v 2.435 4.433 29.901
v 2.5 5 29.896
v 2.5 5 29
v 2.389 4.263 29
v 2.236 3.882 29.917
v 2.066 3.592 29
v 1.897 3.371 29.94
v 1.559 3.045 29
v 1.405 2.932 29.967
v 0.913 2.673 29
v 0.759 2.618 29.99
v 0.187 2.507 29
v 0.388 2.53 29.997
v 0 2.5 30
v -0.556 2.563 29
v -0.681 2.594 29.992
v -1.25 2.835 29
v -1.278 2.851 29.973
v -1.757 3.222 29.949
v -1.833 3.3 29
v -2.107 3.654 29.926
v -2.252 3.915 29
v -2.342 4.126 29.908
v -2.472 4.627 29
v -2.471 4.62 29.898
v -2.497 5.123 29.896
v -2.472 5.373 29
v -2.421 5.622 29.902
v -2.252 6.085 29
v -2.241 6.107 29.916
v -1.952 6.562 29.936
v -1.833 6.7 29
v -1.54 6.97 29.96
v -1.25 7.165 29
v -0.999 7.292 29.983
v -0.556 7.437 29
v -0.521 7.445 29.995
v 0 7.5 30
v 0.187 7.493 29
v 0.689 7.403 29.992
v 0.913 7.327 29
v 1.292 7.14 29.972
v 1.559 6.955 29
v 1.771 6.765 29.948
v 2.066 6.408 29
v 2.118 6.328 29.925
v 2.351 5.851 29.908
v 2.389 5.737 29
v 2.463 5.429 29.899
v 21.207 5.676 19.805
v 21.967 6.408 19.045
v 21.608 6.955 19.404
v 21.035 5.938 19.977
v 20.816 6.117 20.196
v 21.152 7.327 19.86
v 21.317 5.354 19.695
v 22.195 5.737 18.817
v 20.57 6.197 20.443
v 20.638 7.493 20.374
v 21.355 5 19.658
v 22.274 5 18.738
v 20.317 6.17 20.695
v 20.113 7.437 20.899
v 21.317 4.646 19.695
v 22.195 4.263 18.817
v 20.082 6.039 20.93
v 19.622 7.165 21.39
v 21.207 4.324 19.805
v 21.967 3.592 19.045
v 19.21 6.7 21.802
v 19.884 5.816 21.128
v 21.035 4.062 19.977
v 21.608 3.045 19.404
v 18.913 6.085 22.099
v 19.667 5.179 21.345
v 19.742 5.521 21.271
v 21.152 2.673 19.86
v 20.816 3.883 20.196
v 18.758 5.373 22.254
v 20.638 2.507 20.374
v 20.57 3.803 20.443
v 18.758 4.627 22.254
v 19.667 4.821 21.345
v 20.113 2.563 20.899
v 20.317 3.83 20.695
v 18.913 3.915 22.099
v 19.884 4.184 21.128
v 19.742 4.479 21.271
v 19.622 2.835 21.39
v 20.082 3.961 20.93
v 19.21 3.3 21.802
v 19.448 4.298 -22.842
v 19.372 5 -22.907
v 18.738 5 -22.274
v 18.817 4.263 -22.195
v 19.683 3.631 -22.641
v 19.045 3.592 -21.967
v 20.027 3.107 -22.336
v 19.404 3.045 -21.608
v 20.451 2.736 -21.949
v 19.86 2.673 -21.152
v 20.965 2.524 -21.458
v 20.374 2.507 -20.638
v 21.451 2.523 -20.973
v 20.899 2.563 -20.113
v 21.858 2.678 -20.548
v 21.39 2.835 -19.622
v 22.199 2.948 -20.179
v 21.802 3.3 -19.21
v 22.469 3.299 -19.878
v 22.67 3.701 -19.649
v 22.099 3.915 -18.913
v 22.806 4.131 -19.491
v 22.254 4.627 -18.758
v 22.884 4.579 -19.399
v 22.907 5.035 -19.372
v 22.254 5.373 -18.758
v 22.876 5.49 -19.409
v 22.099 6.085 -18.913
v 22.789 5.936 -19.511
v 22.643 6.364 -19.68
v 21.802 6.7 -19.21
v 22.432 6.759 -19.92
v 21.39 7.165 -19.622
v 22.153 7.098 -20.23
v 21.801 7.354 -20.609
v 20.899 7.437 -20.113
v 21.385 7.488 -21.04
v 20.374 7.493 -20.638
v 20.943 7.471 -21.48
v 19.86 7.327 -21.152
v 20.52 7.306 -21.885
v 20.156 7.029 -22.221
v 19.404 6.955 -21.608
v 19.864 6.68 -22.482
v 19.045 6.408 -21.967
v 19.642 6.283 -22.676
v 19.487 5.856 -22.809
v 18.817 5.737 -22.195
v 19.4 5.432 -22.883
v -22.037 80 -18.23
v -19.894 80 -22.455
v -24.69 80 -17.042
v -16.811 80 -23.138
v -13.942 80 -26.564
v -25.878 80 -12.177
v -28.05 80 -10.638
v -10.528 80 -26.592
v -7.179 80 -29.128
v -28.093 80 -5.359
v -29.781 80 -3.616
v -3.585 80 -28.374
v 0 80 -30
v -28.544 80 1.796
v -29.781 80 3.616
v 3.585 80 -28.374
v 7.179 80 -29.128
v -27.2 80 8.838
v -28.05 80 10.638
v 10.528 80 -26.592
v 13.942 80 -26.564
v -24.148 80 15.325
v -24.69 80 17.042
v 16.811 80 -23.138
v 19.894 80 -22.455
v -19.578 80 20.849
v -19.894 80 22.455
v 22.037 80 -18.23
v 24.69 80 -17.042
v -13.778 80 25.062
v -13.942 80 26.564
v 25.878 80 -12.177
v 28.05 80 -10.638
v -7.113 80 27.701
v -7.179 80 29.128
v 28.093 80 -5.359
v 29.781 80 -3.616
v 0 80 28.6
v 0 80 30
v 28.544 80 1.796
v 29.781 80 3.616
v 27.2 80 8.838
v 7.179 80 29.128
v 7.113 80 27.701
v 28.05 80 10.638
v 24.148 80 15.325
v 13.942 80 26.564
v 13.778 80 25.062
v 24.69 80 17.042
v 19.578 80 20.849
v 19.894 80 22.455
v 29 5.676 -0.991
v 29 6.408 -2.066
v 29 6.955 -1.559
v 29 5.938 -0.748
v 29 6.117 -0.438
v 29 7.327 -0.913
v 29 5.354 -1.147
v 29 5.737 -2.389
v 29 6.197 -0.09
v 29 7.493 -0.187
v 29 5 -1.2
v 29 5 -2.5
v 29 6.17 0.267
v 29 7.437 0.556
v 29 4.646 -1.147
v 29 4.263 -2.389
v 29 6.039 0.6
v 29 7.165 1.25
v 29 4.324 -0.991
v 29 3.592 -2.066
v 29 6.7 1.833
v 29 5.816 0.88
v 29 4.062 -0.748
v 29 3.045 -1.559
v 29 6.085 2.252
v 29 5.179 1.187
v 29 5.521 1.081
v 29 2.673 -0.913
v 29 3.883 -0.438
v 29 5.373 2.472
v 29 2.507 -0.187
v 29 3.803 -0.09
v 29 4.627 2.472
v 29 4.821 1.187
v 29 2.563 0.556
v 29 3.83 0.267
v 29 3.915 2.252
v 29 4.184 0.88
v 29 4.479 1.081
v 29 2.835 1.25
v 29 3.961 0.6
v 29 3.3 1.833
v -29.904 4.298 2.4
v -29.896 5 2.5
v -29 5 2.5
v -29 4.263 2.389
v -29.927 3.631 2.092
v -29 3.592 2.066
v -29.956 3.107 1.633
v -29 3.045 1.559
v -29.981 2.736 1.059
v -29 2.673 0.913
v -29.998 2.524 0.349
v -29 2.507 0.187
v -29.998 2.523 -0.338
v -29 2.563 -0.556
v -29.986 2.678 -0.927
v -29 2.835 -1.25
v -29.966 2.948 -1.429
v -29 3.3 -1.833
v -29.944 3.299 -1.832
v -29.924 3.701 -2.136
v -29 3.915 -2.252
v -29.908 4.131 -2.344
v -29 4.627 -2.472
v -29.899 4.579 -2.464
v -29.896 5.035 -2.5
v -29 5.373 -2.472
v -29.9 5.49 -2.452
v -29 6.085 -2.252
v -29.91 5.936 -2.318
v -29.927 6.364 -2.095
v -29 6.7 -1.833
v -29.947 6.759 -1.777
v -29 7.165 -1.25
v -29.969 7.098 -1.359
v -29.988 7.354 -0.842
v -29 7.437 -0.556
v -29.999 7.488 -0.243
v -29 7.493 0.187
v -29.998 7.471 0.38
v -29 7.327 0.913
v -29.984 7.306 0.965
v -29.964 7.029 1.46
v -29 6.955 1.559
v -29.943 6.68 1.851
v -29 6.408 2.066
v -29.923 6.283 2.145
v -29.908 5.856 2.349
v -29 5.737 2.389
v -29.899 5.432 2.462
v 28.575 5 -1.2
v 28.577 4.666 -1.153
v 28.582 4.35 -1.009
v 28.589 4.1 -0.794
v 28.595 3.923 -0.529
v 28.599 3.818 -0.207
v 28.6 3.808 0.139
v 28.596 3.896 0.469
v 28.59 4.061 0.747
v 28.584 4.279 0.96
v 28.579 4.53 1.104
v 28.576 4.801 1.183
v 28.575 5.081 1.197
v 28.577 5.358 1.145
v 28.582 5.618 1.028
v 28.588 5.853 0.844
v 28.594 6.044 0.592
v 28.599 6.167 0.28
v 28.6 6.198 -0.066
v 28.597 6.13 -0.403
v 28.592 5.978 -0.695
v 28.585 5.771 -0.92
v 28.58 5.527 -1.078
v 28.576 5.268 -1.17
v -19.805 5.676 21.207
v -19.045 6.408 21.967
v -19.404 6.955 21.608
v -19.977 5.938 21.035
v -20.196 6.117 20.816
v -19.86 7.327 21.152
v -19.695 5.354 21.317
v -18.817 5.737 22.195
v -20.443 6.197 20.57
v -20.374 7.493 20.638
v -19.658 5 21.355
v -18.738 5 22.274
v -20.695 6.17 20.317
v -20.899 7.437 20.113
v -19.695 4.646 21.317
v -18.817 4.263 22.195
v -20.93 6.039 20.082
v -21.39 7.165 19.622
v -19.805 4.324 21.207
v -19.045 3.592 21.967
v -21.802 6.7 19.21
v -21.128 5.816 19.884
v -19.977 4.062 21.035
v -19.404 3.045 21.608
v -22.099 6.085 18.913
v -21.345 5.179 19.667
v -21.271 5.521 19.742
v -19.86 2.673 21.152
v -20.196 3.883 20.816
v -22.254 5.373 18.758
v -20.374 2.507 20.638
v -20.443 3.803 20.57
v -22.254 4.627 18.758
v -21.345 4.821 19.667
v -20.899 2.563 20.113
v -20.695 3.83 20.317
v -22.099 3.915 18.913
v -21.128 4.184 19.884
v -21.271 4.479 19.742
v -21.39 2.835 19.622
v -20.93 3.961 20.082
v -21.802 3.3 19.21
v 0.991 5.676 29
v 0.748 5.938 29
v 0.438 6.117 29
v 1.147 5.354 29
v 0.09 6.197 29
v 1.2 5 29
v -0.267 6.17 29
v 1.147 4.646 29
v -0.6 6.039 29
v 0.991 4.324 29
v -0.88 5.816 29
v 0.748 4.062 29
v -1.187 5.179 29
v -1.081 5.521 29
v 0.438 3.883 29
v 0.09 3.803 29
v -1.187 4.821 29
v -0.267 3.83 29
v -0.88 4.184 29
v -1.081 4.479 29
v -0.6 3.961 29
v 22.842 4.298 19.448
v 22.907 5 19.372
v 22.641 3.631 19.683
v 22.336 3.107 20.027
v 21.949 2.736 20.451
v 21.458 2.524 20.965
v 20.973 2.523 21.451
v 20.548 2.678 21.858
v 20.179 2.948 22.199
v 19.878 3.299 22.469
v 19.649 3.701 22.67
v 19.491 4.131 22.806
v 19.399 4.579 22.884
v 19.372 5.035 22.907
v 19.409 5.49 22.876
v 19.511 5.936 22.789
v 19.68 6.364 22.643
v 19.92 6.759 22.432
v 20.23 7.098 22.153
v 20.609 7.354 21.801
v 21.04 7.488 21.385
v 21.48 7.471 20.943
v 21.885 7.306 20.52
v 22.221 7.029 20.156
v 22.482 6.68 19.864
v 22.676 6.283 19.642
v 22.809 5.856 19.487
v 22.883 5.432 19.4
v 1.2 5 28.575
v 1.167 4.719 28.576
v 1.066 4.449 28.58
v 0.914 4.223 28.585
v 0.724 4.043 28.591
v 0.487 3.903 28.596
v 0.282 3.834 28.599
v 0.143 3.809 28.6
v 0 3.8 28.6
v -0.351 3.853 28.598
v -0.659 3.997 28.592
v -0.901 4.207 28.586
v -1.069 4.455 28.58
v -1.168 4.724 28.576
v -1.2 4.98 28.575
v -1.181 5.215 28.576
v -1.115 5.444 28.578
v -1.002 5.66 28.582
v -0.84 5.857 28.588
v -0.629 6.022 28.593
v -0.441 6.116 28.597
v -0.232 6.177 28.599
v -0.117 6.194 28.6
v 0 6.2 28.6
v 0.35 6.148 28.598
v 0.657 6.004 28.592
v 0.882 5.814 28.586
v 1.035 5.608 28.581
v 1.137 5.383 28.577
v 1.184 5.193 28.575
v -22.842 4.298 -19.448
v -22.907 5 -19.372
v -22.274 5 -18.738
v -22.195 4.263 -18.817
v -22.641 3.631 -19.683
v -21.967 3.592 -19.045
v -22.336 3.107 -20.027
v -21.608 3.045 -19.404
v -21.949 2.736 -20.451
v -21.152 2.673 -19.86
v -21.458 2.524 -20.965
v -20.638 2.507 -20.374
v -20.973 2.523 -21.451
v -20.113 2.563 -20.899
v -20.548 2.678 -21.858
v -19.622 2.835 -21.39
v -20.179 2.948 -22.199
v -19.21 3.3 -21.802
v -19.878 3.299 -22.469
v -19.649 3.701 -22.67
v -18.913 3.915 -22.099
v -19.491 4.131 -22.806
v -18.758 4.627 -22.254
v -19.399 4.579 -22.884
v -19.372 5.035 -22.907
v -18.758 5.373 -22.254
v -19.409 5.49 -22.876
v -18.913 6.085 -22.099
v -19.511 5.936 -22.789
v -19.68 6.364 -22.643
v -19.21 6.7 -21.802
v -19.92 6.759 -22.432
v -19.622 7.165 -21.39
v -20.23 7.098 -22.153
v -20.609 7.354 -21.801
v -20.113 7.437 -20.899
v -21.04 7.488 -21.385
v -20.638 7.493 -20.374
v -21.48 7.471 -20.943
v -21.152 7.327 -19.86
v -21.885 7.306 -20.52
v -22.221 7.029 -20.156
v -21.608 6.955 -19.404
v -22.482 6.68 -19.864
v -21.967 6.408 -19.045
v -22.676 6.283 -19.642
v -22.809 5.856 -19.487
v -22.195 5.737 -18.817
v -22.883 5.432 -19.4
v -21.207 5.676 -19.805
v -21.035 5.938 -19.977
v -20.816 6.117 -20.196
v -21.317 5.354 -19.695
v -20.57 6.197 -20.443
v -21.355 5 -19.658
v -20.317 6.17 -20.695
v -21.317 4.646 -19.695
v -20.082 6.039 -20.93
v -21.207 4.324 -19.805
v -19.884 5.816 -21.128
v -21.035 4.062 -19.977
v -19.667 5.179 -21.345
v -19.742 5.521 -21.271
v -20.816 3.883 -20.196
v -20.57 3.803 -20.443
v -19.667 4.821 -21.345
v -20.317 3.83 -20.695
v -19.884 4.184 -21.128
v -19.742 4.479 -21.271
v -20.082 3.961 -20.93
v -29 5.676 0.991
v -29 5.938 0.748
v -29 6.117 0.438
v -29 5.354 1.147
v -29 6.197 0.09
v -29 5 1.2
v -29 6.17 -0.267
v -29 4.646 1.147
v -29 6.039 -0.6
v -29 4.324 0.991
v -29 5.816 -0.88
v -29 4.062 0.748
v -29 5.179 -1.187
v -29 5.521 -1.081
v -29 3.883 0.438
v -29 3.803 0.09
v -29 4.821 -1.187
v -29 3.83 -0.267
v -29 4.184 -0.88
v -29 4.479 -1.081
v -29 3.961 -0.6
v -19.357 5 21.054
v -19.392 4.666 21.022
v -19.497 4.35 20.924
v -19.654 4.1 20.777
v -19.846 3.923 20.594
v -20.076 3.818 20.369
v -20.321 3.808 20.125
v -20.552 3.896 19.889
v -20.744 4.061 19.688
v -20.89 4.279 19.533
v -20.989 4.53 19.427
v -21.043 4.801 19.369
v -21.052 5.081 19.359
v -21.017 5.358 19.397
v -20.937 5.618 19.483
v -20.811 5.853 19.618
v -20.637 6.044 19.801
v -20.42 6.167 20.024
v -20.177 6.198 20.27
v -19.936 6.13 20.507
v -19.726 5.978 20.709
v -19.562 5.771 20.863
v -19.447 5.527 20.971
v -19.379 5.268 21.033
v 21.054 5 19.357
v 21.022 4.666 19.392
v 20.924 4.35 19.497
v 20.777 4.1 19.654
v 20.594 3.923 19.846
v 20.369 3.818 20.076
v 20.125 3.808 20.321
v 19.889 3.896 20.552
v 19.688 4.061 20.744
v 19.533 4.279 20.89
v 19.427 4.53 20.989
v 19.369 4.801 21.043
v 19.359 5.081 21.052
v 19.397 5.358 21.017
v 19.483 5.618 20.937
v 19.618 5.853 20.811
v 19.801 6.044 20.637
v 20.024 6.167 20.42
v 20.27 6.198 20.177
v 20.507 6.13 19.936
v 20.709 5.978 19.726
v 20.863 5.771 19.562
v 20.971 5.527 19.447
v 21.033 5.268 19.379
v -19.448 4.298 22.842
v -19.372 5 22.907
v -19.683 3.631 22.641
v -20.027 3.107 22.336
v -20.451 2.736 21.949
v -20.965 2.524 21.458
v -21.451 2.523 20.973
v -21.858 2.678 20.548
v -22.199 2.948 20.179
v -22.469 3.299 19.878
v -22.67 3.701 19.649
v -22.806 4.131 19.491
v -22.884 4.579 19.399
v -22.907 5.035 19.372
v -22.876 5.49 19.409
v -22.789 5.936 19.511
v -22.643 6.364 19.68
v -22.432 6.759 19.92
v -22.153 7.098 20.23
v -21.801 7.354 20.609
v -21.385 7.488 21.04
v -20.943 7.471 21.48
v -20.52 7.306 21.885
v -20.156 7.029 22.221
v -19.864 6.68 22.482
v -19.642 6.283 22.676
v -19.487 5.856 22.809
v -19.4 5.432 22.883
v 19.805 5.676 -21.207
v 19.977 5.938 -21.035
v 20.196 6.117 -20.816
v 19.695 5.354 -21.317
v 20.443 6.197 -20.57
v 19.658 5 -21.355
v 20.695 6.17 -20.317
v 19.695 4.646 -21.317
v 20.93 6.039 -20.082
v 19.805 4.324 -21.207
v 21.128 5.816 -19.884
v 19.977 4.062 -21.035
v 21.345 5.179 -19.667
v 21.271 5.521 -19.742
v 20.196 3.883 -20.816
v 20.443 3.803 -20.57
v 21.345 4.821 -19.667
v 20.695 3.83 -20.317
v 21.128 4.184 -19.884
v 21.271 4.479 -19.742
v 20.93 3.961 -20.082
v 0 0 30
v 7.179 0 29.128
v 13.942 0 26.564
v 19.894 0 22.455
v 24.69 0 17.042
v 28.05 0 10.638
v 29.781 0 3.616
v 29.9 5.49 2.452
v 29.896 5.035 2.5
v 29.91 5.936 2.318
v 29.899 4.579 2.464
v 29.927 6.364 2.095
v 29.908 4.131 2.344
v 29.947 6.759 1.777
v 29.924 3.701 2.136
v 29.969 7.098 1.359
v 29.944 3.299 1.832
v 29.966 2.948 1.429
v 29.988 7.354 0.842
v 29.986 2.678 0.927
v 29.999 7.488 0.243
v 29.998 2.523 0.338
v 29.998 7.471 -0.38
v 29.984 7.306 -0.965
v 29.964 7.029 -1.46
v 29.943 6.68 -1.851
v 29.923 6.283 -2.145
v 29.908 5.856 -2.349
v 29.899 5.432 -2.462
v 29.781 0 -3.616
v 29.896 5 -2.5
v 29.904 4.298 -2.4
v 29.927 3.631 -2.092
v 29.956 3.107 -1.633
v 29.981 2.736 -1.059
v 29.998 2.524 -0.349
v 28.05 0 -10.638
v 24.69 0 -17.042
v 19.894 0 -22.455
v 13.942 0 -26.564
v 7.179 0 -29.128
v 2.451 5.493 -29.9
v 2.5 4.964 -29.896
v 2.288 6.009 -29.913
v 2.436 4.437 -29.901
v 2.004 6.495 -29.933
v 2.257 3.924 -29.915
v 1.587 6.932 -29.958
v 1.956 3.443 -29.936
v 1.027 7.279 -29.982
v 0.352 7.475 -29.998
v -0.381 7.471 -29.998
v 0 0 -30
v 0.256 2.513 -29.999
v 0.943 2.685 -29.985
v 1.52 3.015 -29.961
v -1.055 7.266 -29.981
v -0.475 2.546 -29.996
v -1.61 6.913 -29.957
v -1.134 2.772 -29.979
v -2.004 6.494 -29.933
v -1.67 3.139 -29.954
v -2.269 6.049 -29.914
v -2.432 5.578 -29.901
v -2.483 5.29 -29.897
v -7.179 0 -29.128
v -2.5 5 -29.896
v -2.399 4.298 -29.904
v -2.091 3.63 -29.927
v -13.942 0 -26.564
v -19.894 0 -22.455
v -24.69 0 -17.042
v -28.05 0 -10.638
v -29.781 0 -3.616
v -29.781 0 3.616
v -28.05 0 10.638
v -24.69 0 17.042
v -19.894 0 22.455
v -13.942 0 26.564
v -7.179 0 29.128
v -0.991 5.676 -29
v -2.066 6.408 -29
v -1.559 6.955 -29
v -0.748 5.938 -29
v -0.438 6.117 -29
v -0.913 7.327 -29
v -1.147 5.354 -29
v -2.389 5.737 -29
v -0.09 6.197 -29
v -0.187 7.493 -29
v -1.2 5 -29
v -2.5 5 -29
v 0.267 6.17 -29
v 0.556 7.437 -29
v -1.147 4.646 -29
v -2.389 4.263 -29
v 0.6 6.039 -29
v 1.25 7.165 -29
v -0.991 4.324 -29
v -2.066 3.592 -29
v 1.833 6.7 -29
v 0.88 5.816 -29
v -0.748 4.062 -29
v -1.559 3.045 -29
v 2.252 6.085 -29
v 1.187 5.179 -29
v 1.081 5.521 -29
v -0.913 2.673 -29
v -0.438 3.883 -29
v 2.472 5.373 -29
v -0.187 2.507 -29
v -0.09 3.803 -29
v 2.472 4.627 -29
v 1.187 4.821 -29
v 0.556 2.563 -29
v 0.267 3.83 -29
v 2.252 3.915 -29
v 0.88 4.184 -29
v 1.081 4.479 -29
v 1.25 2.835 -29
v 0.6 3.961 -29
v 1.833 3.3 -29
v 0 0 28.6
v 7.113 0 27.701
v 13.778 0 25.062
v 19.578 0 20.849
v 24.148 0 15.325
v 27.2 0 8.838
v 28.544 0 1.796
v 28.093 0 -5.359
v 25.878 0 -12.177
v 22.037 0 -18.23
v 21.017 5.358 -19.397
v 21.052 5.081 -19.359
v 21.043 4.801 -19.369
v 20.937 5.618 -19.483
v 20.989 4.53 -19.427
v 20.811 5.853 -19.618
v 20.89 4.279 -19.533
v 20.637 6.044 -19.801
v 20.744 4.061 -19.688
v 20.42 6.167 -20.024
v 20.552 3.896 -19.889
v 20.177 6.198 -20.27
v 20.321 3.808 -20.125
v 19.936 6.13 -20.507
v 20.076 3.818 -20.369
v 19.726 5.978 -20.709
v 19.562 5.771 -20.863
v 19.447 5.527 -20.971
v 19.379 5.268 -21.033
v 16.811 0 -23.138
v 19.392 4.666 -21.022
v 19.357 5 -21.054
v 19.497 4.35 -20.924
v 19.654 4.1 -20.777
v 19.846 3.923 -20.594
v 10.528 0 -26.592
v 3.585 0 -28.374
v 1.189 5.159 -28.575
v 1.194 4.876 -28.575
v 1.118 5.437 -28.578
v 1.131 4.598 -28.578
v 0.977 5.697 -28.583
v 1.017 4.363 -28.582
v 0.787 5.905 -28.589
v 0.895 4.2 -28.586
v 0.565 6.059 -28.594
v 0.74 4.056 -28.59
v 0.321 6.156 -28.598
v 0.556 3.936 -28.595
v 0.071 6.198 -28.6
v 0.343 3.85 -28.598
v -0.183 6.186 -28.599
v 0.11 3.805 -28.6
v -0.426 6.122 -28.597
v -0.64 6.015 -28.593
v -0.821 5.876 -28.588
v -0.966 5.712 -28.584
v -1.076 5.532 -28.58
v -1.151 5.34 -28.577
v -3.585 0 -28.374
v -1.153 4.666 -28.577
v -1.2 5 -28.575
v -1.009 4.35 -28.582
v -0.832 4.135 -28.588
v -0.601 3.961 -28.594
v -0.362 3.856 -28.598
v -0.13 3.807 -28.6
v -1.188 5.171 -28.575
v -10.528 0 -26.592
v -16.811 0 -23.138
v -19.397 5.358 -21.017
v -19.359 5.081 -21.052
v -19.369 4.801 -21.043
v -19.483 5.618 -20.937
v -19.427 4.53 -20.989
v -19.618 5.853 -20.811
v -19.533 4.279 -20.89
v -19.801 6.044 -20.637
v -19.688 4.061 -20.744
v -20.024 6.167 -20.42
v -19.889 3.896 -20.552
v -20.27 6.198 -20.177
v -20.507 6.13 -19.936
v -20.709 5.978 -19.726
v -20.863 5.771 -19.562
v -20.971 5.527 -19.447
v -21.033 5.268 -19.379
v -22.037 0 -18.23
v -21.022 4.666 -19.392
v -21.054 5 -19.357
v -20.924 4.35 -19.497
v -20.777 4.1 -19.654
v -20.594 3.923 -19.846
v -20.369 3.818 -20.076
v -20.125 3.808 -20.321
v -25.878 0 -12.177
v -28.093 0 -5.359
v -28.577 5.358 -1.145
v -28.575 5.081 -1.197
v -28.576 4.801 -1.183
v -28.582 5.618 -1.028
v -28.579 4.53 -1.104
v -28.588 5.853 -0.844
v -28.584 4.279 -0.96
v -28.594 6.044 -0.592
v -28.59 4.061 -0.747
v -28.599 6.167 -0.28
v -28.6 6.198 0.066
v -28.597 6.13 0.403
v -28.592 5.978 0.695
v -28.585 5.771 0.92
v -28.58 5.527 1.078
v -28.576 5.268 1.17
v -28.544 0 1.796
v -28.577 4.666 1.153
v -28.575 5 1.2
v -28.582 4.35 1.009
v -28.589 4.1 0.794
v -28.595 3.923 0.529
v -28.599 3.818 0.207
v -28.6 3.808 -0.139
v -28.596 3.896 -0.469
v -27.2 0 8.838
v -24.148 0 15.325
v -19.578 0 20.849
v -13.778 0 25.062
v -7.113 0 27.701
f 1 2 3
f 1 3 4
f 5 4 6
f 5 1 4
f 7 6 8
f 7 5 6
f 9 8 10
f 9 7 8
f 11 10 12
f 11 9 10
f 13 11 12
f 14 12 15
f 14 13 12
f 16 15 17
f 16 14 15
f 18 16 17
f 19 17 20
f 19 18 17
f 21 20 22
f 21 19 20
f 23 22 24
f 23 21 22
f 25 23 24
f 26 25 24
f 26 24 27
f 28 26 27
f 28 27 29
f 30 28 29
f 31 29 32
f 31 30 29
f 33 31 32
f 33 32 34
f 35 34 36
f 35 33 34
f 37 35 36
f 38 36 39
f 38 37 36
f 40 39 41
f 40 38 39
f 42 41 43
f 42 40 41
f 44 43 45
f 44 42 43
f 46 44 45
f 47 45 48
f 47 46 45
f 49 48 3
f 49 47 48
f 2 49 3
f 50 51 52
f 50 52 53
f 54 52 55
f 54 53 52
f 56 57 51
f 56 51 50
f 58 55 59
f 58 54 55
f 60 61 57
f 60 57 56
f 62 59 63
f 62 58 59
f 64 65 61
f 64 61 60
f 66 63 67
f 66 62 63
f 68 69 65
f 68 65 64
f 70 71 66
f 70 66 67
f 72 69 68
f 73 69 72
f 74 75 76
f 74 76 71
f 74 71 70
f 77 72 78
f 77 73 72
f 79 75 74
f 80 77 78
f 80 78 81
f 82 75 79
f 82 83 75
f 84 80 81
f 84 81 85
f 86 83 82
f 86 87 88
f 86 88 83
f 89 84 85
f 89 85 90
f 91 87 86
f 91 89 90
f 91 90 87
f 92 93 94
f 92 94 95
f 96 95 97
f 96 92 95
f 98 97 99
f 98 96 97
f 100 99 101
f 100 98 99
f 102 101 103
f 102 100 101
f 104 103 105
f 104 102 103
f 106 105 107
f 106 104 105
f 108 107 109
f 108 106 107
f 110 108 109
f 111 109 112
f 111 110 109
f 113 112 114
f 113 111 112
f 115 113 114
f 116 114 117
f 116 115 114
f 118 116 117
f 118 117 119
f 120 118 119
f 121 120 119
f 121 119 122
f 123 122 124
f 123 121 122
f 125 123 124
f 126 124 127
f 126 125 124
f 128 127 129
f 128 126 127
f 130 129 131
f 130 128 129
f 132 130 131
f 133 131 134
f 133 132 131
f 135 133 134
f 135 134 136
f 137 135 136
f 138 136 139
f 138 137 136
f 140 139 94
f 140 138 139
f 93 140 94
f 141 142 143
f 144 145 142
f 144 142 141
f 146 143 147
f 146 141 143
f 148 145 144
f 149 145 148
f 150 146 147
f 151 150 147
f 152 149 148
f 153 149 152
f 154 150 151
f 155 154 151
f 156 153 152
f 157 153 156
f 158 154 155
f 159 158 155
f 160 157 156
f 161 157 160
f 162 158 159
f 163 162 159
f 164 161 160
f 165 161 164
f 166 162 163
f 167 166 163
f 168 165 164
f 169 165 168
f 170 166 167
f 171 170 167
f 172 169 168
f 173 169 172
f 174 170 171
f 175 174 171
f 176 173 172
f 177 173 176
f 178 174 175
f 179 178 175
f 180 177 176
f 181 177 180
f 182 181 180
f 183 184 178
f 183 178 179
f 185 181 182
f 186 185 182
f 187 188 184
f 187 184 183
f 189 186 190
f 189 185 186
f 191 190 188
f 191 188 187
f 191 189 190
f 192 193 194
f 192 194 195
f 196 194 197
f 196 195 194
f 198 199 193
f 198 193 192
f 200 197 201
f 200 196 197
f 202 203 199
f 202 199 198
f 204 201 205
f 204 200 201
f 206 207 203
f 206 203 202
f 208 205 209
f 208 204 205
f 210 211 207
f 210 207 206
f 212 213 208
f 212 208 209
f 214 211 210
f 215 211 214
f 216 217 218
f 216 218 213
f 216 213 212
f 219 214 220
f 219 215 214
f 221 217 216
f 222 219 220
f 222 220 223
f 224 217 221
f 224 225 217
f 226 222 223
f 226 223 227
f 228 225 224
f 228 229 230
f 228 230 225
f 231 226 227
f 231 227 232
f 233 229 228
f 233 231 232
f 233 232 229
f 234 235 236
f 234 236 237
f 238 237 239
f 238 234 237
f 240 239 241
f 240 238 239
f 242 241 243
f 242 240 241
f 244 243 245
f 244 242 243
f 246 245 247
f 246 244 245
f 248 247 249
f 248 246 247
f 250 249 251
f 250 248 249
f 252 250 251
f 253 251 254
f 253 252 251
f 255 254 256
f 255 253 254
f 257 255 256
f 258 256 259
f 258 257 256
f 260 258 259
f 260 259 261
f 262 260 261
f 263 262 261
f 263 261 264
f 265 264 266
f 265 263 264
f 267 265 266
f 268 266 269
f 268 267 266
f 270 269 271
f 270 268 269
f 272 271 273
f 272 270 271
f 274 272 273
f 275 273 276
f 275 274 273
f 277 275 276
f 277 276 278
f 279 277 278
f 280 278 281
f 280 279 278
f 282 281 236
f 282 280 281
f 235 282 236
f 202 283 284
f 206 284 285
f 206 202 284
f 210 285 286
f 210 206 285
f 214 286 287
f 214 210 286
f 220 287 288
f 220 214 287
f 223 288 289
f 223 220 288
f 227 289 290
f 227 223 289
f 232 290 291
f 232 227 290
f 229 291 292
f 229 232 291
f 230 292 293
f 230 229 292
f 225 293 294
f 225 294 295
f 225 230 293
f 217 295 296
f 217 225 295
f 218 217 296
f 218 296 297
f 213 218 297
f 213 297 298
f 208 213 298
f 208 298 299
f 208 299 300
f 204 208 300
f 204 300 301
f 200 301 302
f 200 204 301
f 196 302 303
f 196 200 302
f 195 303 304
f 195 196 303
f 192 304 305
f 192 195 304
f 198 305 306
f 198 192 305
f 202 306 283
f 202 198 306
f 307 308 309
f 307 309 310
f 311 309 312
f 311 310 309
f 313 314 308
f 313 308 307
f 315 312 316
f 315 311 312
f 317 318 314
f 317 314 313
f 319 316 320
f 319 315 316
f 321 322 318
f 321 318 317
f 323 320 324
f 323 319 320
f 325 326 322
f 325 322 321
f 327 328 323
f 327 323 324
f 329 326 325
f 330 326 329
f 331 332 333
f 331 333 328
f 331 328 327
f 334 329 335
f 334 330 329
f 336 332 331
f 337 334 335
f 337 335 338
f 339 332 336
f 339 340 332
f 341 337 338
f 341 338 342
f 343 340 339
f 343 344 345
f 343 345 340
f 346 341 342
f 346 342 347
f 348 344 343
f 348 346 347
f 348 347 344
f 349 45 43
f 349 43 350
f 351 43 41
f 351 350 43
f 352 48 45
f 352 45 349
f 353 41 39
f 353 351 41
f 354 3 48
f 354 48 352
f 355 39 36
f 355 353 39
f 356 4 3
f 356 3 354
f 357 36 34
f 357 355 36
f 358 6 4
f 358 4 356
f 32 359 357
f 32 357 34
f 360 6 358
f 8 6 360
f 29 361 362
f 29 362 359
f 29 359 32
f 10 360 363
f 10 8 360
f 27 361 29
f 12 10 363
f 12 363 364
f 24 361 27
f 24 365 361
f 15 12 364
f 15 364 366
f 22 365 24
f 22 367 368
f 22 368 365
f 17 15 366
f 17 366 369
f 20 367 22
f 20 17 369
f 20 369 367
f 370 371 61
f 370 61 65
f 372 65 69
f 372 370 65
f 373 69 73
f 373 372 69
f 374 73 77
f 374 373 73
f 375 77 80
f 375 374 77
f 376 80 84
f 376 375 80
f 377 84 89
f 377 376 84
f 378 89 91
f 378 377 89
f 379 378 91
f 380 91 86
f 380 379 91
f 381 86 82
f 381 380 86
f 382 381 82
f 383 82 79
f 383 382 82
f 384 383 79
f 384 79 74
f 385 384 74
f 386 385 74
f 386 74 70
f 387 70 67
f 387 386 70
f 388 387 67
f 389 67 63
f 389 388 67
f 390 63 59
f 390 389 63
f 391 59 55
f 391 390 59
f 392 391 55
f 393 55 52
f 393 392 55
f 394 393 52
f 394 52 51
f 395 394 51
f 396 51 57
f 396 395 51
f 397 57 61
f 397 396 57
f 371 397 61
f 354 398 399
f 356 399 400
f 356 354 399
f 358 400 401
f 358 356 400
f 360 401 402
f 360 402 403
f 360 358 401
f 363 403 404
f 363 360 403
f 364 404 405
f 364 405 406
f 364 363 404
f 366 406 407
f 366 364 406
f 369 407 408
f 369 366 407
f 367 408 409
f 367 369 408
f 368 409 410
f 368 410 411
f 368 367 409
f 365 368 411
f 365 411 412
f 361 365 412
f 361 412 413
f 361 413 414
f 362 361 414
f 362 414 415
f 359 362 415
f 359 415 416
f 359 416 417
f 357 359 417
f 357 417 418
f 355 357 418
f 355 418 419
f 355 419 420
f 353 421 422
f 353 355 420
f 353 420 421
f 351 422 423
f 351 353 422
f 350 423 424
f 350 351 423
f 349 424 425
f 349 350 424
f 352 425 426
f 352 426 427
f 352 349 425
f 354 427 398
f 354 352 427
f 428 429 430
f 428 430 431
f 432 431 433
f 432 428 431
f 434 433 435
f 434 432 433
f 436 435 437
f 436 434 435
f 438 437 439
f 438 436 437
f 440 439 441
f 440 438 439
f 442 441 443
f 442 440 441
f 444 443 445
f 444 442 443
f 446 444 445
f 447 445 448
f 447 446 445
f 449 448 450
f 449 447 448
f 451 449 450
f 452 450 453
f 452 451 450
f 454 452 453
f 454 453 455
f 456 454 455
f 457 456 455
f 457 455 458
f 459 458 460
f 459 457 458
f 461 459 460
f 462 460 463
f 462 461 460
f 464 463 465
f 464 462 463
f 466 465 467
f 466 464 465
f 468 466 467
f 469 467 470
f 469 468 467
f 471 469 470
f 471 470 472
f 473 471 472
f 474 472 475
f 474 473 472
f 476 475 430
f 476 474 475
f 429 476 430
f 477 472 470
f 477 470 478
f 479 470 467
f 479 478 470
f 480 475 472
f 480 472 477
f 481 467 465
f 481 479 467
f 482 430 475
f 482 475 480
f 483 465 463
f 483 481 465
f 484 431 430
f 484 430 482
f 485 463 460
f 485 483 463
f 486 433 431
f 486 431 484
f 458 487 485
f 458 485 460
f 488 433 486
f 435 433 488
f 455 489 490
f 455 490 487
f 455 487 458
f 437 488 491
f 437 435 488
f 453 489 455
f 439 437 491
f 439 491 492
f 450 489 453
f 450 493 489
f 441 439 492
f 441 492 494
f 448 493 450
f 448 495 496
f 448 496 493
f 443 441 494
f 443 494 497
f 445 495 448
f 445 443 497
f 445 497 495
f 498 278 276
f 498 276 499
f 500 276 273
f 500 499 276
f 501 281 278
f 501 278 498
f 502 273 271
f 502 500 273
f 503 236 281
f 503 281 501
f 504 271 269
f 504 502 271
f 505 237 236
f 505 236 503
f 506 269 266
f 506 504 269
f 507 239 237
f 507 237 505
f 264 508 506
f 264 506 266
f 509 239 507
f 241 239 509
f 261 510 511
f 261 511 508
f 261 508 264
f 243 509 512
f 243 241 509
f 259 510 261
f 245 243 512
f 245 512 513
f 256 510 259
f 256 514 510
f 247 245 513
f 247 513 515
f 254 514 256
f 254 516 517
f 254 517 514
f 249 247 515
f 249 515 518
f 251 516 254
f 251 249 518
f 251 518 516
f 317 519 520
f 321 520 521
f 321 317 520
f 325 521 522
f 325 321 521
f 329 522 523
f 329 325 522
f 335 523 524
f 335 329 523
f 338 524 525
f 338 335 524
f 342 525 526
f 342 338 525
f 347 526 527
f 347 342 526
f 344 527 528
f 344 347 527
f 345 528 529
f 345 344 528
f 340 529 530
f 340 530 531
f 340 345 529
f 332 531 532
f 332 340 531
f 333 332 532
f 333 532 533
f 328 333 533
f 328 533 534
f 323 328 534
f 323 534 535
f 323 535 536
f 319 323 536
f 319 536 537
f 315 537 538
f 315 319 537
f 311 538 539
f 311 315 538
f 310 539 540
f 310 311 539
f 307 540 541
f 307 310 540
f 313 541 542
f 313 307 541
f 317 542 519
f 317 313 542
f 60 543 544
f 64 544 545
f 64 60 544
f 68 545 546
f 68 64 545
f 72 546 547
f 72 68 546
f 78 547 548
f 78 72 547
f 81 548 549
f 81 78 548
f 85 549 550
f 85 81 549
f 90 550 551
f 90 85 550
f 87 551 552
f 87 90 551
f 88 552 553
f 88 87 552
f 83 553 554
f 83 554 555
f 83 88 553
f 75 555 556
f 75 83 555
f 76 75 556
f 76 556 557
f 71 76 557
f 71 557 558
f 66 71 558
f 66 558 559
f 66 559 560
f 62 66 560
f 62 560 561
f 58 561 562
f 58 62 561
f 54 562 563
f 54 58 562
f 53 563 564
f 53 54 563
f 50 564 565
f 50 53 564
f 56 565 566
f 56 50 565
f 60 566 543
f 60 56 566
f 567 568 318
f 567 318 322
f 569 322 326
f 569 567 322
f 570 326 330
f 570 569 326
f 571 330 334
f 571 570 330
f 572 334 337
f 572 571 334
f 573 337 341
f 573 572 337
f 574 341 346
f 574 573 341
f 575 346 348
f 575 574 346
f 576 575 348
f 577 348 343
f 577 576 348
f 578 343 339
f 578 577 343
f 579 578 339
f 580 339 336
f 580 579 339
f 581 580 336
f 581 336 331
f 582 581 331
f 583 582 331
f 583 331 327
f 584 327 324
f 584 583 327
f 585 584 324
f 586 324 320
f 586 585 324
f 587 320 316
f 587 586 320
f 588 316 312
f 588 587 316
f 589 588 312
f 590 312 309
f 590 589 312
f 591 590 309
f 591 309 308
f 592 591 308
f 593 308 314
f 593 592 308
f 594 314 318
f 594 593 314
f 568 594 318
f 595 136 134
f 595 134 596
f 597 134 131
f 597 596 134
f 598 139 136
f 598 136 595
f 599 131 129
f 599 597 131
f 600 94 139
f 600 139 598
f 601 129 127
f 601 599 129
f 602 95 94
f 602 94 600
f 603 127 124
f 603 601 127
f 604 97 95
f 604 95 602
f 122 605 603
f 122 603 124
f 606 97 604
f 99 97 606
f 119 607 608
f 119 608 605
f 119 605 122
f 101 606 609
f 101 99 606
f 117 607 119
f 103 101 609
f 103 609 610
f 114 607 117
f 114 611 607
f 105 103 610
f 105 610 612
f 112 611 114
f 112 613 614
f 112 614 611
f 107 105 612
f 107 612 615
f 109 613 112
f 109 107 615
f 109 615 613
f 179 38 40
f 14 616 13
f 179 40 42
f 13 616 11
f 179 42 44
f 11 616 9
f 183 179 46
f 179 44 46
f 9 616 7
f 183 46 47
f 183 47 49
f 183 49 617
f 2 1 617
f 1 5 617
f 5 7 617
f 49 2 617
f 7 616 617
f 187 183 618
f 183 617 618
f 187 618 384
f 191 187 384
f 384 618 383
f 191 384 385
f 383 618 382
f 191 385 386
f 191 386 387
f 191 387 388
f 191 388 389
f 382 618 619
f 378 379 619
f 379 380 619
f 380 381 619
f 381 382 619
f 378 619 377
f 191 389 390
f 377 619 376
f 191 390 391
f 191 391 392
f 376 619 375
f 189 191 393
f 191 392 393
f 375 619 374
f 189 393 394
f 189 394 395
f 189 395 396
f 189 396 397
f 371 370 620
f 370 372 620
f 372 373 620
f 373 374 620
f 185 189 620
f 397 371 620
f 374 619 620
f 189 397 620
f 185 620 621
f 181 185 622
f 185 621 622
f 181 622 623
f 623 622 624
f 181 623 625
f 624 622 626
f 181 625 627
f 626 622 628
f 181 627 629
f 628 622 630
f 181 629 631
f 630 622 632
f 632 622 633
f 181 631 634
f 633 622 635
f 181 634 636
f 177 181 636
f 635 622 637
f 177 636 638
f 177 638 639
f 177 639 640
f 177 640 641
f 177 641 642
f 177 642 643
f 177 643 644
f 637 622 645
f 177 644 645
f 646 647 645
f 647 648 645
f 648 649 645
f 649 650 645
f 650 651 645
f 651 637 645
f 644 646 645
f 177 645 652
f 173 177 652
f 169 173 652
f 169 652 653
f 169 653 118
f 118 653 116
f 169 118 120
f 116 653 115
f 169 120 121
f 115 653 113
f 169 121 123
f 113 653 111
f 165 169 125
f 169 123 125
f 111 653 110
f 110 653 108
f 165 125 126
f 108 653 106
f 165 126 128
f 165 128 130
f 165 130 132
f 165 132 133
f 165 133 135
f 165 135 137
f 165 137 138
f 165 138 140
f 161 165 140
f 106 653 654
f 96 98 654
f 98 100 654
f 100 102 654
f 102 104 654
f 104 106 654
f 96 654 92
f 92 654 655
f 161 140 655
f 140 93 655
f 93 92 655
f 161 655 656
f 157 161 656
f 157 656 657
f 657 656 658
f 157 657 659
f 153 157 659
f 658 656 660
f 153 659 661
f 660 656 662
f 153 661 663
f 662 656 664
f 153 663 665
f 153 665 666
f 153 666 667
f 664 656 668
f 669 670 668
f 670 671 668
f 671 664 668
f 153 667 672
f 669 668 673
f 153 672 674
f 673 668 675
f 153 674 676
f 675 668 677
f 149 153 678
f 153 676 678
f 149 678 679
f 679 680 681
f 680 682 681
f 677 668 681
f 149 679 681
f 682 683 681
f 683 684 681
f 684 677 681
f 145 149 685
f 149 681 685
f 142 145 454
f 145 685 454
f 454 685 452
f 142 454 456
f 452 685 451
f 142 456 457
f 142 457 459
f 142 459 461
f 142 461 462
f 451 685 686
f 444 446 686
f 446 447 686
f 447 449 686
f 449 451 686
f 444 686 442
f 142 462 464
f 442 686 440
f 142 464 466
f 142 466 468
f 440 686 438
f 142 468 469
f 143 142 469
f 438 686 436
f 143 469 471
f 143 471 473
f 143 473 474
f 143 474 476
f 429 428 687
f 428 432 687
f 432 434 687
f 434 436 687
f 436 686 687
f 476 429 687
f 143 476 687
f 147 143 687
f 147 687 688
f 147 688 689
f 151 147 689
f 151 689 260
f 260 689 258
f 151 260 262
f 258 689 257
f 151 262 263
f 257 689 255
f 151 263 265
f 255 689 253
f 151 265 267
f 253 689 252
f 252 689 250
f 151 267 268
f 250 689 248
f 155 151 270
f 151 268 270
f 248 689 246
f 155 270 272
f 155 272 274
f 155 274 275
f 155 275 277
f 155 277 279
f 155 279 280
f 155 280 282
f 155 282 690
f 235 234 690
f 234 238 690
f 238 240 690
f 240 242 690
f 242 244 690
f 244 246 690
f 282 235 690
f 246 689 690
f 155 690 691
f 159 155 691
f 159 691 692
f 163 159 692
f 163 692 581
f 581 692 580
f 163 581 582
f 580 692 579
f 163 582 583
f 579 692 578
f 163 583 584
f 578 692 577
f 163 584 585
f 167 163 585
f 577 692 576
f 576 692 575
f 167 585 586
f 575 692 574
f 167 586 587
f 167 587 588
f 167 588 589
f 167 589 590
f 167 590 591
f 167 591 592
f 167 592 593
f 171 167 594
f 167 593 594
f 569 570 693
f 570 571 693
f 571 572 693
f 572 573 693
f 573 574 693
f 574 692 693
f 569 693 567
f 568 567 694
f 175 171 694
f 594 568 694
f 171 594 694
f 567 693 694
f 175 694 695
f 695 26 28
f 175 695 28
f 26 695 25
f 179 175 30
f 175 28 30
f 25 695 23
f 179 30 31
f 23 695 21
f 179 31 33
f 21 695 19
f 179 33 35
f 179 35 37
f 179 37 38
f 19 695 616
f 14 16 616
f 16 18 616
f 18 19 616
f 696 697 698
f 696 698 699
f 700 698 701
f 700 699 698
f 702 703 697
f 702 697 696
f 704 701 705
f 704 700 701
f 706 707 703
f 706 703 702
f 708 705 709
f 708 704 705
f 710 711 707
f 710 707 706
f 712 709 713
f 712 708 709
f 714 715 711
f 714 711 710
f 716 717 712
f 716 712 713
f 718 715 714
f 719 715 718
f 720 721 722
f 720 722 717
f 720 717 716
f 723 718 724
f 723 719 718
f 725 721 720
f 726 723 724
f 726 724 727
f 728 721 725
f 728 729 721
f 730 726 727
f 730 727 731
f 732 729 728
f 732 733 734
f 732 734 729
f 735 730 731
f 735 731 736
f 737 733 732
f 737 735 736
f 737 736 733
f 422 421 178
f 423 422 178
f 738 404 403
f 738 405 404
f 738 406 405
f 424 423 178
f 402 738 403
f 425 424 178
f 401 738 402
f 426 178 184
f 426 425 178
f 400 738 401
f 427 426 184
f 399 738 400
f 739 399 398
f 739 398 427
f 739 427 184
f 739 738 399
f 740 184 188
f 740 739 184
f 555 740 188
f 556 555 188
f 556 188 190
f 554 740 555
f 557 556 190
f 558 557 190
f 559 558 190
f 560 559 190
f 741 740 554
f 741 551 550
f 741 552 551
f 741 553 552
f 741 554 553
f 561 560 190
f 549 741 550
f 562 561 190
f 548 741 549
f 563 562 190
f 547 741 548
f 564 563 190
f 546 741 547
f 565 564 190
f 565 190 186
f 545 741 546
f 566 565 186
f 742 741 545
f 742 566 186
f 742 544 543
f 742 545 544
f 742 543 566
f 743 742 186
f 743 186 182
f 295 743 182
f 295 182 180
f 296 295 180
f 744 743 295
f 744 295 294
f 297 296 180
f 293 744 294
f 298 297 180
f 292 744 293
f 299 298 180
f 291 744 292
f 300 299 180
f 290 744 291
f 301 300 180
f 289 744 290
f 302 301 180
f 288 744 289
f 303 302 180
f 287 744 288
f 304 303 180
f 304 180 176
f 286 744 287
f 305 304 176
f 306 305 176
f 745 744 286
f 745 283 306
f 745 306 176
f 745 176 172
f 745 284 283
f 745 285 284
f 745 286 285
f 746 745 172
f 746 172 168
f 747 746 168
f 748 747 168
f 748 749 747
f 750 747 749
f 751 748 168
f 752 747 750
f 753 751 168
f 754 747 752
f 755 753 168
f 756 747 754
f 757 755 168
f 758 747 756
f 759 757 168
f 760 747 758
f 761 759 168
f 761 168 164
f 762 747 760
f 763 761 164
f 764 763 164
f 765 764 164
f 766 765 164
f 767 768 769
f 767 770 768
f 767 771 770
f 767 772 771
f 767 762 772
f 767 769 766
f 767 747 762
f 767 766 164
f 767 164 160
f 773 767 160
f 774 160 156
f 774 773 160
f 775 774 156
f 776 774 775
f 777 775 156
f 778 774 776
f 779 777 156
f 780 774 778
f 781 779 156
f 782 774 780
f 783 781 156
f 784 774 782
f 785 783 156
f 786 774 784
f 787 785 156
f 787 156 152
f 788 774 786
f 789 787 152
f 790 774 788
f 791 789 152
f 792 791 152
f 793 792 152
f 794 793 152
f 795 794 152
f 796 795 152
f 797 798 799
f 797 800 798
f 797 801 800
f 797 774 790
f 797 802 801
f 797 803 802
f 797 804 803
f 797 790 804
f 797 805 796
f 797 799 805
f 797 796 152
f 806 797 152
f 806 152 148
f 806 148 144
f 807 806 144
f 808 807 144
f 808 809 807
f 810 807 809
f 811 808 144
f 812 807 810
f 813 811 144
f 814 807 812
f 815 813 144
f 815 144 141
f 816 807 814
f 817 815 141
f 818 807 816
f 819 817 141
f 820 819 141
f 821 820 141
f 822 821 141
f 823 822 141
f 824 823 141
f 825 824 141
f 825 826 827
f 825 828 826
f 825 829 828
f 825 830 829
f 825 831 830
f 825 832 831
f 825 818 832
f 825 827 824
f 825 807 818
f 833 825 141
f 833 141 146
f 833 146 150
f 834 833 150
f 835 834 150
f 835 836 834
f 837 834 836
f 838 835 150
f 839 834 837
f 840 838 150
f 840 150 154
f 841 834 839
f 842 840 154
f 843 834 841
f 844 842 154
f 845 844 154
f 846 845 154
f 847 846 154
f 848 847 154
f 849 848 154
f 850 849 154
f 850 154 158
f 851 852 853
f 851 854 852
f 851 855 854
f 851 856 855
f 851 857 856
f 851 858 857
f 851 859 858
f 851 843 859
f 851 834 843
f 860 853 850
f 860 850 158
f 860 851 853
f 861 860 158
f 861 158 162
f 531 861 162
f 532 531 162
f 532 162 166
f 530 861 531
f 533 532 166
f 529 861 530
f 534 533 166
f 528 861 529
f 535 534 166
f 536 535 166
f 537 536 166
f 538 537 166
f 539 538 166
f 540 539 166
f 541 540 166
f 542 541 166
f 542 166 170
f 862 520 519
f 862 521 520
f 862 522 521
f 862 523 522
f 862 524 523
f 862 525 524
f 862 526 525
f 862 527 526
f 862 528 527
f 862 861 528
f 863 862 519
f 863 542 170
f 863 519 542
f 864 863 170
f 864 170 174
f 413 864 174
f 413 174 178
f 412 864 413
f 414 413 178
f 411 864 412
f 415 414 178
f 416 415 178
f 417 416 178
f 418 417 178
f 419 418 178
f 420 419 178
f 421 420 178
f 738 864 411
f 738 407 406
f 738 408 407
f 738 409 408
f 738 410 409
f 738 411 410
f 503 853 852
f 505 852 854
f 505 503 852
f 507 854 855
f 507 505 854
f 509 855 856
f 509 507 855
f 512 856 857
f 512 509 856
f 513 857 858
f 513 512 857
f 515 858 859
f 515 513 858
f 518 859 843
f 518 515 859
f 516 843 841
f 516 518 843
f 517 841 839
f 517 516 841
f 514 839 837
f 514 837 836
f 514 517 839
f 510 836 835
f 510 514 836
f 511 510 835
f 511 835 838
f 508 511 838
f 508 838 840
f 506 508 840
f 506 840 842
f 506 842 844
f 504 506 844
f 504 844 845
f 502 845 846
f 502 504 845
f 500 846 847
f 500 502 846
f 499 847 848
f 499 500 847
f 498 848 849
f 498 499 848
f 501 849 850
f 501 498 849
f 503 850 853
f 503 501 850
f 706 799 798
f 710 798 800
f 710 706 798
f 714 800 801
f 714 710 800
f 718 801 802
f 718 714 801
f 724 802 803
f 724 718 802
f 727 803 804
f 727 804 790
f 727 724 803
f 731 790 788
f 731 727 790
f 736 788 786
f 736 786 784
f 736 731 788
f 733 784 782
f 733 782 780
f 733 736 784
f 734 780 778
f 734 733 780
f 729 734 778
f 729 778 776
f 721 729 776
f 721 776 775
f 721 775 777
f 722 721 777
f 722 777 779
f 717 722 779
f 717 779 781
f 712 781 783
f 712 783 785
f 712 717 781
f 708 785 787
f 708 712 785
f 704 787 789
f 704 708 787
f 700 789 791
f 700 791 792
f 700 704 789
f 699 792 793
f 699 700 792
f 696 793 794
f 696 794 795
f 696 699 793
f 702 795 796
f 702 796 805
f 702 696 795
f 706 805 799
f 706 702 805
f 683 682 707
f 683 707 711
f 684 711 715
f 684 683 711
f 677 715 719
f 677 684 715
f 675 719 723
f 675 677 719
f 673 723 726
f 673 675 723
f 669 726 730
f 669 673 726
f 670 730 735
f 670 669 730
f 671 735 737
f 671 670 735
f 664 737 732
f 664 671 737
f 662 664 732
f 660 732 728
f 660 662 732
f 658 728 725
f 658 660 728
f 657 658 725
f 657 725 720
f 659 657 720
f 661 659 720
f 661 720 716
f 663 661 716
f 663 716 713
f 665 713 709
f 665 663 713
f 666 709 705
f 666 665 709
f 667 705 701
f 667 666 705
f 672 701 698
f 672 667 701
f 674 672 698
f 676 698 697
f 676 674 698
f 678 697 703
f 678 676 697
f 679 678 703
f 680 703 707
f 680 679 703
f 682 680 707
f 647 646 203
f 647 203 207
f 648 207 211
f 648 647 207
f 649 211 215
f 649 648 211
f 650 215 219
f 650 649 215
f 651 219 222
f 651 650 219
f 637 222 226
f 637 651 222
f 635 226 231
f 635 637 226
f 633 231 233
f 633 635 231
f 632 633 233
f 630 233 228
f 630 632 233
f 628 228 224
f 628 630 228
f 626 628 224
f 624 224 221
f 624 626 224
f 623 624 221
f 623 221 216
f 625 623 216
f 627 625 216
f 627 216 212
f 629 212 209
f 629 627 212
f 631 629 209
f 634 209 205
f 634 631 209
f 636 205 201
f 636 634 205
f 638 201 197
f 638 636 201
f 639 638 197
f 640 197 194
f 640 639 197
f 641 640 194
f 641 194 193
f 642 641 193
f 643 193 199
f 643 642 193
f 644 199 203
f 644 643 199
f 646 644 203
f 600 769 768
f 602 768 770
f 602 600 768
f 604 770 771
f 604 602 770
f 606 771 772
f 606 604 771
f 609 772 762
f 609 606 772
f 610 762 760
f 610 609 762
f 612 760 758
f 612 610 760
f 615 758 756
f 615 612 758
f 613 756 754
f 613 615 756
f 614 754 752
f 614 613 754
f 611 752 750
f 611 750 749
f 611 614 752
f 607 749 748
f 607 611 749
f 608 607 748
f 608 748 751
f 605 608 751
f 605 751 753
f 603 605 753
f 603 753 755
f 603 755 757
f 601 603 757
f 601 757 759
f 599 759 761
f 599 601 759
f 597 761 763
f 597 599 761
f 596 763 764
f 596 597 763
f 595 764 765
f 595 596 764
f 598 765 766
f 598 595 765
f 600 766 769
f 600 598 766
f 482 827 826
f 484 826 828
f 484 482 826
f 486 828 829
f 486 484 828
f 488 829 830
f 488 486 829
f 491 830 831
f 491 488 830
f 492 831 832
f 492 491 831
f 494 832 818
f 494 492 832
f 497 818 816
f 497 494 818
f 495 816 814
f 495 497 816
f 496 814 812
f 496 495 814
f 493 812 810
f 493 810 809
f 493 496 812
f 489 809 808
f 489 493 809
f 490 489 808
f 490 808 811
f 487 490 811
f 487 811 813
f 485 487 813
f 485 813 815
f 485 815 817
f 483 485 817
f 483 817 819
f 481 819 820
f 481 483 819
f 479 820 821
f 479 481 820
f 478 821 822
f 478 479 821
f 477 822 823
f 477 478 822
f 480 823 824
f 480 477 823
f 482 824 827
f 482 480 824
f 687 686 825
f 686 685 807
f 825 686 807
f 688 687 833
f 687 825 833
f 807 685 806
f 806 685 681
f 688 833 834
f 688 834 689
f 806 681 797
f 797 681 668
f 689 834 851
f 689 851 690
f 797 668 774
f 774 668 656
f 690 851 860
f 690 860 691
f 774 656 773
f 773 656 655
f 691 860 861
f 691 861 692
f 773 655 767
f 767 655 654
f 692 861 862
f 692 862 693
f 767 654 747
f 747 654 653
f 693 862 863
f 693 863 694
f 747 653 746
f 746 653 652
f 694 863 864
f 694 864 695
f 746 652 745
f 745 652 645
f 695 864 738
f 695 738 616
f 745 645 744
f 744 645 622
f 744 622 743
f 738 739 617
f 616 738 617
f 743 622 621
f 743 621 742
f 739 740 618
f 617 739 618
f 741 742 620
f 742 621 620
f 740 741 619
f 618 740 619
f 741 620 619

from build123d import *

# Parameters (mm, degrees)
SKETCH_1_R               = 30
SKETCH_1_R_2             = 28.6
EXTRUDE_1_DEPTH          = 80
PATTERN_CIRCULAR_1_COUNT = 8


with BuildPart() as part:
    # 스케치1 → 보스-돌출1 (new body)
    with BuildSketch(Plane(origin=(0, 0, 0), x_dir=(1, 0, 0), z_dir=(0, 1, 0))):
        with Locations(Location((0, 0, 0), (0, 0, 270))):
            Circle(SKETCH_1_R)
        with Locations(Location((0, 0, 0), (0, 0, 270))):
            Circle(SKETCH_1_R_2, mode=Mode.SUBTRACT)
    extrude(amount=EXTRUDE_1_DEPTH)

    # 스케치9 → M2 남비 머리 나사용 카운터보어1 (revolve, cut)
    with BuildSketch(Plane(origin=(-30, 5, 0), x_dir=(0, 0, 1), z_dir=(0, 1, 0))):
        Polygon((0, 0), (0, 10.721032743), (1.2, 10), (1.2, 1), (2.5, 1), (2.5, 0), align=None)
    hole_wizard_m2_1 = revolve(axis=Axis((-36.35, 5, 0), (1, 0, 0)), mode=Mode.SUBTRACT)

    # 원형 패턴1: M2 남비 머리 나사용 카운터보어1 ×8 about axis
    pattern_circular_1_axis = Axis((0, 0, 0), (0, 1, 0))
    for i in range(1, PATTERN_CIRCULAR_1_COUNT):
        add(hole_wizard_m2_1.rotate(pattern_circular_1_axis, i * 360 / PATTERN_CIRCULAR_1_COUNT), mode=Mode.SUBTRACT)


solid = part.part
